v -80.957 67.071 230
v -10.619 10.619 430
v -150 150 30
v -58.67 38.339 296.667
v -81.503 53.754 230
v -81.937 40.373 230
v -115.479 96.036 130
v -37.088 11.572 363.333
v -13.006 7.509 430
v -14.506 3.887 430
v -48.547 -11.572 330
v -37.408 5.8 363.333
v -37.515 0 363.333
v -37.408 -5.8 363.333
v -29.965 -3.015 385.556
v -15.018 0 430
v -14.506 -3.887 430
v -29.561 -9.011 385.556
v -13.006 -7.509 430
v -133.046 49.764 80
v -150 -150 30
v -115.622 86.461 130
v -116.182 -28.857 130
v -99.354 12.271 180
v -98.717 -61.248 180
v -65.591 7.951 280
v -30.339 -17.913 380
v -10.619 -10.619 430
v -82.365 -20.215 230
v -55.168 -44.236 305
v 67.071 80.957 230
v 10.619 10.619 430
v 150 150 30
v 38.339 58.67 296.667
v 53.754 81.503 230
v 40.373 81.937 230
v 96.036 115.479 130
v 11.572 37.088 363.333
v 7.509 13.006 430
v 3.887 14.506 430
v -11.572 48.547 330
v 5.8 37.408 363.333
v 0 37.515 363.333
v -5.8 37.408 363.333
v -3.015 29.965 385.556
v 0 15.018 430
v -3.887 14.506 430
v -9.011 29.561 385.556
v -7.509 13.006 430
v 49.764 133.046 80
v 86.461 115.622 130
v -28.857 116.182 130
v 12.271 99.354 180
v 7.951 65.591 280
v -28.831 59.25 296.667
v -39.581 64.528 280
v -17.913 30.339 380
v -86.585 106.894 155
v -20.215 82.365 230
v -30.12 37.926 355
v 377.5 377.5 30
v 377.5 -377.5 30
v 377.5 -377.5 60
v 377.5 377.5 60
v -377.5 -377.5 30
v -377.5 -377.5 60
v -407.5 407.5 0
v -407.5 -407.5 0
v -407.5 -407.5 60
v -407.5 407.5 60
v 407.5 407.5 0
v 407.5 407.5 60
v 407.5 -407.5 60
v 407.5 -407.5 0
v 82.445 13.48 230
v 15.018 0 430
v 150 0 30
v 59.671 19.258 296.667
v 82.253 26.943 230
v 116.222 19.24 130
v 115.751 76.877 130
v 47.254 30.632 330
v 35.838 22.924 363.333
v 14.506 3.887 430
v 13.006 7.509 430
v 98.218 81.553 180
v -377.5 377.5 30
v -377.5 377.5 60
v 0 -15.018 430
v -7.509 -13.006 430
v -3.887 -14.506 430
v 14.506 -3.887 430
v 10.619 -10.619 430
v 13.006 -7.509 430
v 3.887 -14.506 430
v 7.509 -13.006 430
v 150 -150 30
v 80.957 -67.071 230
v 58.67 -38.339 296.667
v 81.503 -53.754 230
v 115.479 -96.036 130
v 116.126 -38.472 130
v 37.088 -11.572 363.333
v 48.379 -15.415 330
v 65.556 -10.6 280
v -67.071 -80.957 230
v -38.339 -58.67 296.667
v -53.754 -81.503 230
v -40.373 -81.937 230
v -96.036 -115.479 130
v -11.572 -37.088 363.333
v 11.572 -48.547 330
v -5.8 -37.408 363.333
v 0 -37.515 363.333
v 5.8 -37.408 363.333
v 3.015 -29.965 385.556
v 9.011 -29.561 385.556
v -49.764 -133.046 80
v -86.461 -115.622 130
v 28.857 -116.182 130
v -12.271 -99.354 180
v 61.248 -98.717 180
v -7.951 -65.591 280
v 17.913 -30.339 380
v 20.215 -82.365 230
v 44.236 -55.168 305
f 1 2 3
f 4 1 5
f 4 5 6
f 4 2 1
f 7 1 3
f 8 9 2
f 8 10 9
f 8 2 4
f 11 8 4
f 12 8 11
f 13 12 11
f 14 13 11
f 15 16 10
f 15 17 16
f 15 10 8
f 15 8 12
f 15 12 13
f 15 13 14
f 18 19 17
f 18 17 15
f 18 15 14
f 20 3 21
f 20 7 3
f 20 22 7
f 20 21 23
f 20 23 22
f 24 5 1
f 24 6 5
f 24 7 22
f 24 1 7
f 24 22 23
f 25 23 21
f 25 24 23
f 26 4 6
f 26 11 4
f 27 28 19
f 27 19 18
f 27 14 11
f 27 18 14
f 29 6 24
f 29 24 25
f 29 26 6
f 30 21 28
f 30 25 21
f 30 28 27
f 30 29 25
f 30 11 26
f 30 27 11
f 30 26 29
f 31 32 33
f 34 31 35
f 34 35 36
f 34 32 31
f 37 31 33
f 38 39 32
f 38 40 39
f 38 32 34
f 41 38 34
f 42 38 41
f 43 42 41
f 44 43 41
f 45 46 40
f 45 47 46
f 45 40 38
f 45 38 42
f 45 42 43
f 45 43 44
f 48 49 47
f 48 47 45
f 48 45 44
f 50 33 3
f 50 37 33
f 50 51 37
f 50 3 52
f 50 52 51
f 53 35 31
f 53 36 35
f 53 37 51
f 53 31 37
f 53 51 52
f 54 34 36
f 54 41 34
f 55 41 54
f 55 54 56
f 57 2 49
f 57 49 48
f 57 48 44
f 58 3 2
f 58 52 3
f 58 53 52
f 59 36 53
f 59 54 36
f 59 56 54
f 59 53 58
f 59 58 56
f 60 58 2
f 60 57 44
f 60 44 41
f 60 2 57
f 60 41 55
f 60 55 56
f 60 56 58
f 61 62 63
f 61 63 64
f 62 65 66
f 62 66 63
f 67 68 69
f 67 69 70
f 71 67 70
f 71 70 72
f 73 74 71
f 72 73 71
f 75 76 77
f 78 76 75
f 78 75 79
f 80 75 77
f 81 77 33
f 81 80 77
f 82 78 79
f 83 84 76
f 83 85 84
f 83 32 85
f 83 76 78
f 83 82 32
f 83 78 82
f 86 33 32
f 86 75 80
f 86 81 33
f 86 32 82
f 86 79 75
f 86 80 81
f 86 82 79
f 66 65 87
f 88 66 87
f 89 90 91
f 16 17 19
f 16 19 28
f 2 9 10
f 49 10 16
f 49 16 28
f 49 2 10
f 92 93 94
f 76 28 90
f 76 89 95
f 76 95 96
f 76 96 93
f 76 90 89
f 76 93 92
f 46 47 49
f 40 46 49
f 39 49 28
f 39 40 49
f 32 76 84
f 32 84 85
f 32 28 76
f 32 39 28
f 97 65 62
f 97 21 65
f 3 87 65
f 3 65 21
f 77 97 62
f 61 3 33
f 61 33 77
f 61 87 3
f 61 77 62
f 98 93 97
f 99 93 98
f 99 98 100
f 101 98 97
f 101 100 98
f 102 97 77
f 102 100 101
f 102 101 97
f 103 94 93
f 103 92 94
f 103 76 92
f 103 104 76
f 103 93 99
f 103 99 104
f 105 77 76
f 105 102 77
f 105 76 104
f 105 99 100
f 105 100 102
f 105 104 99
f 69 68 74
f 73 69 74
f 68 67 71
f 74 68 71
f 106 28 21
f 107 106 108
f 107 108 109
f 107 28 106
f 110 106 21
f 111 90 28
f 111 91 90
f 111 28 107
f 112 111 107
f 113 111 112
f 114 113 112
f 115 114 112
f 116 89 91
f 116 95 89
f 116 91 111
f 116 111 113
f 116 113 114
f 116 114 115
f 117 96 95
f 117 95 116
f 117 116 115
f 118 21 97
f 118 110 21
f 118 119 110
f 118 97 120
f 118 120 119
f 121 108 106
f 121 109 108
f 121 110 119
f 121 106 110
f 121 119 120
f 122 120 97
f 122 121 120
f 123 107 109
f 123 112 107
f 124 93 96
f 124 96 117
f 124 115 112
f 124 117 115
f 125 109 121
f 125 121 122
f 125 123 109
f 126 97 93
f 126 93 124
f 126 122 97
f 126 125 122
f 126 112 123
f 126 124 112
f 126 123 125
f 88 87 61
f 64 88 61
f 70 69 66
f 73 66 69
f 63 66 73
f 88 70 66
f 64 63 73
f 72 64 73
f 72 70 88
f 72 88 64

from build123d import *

# Parameters (mm, degrees)
F0_W     = 755
F0_H     = 755
F0_W_2   = 300
F0_H_2   = 300
F1_DEPTH = 30
F0_W_3   = 815
F0_H_3   = 815
F2_DEPTH = 60
F4_W     = 300
F4_H     = 300
F5_R     = 15.0176261861


with BuildPart() as f1:
    # F0 (on Top) → F1 (new body)
    with BuildSketch(Plane.XY):
        Rectangle(F0_W, F0_H)
        Rectangle(F0_W_2, F0_H_2, mode=Mode.SUBTRACT)
        Rectangle(F0_W_2, F0_H_2)
    extrude(amount=F1_DEPTH)

    # F0 (on Top) → F2 (join)
    with BuildSketch(Plane.XY):
        Rectangle(F0_W_3, F0_H_3)
        Rectangle(F0_W, F0_H, mode=Mode.SUBTRACT)
    extrude(amount=F2_DEPTH)

    # F4 (on face) → F6 section 0
    with BuildSketch(Plane.XY.offset(30)):
        Rectangle(F4_W, F4_H)
    # F5 (on offset) → F6 section 1
    with BuildSketch(Plane.XY.offset(430)):
        Circle(F5_R)
    loft()


solid = f1.part
